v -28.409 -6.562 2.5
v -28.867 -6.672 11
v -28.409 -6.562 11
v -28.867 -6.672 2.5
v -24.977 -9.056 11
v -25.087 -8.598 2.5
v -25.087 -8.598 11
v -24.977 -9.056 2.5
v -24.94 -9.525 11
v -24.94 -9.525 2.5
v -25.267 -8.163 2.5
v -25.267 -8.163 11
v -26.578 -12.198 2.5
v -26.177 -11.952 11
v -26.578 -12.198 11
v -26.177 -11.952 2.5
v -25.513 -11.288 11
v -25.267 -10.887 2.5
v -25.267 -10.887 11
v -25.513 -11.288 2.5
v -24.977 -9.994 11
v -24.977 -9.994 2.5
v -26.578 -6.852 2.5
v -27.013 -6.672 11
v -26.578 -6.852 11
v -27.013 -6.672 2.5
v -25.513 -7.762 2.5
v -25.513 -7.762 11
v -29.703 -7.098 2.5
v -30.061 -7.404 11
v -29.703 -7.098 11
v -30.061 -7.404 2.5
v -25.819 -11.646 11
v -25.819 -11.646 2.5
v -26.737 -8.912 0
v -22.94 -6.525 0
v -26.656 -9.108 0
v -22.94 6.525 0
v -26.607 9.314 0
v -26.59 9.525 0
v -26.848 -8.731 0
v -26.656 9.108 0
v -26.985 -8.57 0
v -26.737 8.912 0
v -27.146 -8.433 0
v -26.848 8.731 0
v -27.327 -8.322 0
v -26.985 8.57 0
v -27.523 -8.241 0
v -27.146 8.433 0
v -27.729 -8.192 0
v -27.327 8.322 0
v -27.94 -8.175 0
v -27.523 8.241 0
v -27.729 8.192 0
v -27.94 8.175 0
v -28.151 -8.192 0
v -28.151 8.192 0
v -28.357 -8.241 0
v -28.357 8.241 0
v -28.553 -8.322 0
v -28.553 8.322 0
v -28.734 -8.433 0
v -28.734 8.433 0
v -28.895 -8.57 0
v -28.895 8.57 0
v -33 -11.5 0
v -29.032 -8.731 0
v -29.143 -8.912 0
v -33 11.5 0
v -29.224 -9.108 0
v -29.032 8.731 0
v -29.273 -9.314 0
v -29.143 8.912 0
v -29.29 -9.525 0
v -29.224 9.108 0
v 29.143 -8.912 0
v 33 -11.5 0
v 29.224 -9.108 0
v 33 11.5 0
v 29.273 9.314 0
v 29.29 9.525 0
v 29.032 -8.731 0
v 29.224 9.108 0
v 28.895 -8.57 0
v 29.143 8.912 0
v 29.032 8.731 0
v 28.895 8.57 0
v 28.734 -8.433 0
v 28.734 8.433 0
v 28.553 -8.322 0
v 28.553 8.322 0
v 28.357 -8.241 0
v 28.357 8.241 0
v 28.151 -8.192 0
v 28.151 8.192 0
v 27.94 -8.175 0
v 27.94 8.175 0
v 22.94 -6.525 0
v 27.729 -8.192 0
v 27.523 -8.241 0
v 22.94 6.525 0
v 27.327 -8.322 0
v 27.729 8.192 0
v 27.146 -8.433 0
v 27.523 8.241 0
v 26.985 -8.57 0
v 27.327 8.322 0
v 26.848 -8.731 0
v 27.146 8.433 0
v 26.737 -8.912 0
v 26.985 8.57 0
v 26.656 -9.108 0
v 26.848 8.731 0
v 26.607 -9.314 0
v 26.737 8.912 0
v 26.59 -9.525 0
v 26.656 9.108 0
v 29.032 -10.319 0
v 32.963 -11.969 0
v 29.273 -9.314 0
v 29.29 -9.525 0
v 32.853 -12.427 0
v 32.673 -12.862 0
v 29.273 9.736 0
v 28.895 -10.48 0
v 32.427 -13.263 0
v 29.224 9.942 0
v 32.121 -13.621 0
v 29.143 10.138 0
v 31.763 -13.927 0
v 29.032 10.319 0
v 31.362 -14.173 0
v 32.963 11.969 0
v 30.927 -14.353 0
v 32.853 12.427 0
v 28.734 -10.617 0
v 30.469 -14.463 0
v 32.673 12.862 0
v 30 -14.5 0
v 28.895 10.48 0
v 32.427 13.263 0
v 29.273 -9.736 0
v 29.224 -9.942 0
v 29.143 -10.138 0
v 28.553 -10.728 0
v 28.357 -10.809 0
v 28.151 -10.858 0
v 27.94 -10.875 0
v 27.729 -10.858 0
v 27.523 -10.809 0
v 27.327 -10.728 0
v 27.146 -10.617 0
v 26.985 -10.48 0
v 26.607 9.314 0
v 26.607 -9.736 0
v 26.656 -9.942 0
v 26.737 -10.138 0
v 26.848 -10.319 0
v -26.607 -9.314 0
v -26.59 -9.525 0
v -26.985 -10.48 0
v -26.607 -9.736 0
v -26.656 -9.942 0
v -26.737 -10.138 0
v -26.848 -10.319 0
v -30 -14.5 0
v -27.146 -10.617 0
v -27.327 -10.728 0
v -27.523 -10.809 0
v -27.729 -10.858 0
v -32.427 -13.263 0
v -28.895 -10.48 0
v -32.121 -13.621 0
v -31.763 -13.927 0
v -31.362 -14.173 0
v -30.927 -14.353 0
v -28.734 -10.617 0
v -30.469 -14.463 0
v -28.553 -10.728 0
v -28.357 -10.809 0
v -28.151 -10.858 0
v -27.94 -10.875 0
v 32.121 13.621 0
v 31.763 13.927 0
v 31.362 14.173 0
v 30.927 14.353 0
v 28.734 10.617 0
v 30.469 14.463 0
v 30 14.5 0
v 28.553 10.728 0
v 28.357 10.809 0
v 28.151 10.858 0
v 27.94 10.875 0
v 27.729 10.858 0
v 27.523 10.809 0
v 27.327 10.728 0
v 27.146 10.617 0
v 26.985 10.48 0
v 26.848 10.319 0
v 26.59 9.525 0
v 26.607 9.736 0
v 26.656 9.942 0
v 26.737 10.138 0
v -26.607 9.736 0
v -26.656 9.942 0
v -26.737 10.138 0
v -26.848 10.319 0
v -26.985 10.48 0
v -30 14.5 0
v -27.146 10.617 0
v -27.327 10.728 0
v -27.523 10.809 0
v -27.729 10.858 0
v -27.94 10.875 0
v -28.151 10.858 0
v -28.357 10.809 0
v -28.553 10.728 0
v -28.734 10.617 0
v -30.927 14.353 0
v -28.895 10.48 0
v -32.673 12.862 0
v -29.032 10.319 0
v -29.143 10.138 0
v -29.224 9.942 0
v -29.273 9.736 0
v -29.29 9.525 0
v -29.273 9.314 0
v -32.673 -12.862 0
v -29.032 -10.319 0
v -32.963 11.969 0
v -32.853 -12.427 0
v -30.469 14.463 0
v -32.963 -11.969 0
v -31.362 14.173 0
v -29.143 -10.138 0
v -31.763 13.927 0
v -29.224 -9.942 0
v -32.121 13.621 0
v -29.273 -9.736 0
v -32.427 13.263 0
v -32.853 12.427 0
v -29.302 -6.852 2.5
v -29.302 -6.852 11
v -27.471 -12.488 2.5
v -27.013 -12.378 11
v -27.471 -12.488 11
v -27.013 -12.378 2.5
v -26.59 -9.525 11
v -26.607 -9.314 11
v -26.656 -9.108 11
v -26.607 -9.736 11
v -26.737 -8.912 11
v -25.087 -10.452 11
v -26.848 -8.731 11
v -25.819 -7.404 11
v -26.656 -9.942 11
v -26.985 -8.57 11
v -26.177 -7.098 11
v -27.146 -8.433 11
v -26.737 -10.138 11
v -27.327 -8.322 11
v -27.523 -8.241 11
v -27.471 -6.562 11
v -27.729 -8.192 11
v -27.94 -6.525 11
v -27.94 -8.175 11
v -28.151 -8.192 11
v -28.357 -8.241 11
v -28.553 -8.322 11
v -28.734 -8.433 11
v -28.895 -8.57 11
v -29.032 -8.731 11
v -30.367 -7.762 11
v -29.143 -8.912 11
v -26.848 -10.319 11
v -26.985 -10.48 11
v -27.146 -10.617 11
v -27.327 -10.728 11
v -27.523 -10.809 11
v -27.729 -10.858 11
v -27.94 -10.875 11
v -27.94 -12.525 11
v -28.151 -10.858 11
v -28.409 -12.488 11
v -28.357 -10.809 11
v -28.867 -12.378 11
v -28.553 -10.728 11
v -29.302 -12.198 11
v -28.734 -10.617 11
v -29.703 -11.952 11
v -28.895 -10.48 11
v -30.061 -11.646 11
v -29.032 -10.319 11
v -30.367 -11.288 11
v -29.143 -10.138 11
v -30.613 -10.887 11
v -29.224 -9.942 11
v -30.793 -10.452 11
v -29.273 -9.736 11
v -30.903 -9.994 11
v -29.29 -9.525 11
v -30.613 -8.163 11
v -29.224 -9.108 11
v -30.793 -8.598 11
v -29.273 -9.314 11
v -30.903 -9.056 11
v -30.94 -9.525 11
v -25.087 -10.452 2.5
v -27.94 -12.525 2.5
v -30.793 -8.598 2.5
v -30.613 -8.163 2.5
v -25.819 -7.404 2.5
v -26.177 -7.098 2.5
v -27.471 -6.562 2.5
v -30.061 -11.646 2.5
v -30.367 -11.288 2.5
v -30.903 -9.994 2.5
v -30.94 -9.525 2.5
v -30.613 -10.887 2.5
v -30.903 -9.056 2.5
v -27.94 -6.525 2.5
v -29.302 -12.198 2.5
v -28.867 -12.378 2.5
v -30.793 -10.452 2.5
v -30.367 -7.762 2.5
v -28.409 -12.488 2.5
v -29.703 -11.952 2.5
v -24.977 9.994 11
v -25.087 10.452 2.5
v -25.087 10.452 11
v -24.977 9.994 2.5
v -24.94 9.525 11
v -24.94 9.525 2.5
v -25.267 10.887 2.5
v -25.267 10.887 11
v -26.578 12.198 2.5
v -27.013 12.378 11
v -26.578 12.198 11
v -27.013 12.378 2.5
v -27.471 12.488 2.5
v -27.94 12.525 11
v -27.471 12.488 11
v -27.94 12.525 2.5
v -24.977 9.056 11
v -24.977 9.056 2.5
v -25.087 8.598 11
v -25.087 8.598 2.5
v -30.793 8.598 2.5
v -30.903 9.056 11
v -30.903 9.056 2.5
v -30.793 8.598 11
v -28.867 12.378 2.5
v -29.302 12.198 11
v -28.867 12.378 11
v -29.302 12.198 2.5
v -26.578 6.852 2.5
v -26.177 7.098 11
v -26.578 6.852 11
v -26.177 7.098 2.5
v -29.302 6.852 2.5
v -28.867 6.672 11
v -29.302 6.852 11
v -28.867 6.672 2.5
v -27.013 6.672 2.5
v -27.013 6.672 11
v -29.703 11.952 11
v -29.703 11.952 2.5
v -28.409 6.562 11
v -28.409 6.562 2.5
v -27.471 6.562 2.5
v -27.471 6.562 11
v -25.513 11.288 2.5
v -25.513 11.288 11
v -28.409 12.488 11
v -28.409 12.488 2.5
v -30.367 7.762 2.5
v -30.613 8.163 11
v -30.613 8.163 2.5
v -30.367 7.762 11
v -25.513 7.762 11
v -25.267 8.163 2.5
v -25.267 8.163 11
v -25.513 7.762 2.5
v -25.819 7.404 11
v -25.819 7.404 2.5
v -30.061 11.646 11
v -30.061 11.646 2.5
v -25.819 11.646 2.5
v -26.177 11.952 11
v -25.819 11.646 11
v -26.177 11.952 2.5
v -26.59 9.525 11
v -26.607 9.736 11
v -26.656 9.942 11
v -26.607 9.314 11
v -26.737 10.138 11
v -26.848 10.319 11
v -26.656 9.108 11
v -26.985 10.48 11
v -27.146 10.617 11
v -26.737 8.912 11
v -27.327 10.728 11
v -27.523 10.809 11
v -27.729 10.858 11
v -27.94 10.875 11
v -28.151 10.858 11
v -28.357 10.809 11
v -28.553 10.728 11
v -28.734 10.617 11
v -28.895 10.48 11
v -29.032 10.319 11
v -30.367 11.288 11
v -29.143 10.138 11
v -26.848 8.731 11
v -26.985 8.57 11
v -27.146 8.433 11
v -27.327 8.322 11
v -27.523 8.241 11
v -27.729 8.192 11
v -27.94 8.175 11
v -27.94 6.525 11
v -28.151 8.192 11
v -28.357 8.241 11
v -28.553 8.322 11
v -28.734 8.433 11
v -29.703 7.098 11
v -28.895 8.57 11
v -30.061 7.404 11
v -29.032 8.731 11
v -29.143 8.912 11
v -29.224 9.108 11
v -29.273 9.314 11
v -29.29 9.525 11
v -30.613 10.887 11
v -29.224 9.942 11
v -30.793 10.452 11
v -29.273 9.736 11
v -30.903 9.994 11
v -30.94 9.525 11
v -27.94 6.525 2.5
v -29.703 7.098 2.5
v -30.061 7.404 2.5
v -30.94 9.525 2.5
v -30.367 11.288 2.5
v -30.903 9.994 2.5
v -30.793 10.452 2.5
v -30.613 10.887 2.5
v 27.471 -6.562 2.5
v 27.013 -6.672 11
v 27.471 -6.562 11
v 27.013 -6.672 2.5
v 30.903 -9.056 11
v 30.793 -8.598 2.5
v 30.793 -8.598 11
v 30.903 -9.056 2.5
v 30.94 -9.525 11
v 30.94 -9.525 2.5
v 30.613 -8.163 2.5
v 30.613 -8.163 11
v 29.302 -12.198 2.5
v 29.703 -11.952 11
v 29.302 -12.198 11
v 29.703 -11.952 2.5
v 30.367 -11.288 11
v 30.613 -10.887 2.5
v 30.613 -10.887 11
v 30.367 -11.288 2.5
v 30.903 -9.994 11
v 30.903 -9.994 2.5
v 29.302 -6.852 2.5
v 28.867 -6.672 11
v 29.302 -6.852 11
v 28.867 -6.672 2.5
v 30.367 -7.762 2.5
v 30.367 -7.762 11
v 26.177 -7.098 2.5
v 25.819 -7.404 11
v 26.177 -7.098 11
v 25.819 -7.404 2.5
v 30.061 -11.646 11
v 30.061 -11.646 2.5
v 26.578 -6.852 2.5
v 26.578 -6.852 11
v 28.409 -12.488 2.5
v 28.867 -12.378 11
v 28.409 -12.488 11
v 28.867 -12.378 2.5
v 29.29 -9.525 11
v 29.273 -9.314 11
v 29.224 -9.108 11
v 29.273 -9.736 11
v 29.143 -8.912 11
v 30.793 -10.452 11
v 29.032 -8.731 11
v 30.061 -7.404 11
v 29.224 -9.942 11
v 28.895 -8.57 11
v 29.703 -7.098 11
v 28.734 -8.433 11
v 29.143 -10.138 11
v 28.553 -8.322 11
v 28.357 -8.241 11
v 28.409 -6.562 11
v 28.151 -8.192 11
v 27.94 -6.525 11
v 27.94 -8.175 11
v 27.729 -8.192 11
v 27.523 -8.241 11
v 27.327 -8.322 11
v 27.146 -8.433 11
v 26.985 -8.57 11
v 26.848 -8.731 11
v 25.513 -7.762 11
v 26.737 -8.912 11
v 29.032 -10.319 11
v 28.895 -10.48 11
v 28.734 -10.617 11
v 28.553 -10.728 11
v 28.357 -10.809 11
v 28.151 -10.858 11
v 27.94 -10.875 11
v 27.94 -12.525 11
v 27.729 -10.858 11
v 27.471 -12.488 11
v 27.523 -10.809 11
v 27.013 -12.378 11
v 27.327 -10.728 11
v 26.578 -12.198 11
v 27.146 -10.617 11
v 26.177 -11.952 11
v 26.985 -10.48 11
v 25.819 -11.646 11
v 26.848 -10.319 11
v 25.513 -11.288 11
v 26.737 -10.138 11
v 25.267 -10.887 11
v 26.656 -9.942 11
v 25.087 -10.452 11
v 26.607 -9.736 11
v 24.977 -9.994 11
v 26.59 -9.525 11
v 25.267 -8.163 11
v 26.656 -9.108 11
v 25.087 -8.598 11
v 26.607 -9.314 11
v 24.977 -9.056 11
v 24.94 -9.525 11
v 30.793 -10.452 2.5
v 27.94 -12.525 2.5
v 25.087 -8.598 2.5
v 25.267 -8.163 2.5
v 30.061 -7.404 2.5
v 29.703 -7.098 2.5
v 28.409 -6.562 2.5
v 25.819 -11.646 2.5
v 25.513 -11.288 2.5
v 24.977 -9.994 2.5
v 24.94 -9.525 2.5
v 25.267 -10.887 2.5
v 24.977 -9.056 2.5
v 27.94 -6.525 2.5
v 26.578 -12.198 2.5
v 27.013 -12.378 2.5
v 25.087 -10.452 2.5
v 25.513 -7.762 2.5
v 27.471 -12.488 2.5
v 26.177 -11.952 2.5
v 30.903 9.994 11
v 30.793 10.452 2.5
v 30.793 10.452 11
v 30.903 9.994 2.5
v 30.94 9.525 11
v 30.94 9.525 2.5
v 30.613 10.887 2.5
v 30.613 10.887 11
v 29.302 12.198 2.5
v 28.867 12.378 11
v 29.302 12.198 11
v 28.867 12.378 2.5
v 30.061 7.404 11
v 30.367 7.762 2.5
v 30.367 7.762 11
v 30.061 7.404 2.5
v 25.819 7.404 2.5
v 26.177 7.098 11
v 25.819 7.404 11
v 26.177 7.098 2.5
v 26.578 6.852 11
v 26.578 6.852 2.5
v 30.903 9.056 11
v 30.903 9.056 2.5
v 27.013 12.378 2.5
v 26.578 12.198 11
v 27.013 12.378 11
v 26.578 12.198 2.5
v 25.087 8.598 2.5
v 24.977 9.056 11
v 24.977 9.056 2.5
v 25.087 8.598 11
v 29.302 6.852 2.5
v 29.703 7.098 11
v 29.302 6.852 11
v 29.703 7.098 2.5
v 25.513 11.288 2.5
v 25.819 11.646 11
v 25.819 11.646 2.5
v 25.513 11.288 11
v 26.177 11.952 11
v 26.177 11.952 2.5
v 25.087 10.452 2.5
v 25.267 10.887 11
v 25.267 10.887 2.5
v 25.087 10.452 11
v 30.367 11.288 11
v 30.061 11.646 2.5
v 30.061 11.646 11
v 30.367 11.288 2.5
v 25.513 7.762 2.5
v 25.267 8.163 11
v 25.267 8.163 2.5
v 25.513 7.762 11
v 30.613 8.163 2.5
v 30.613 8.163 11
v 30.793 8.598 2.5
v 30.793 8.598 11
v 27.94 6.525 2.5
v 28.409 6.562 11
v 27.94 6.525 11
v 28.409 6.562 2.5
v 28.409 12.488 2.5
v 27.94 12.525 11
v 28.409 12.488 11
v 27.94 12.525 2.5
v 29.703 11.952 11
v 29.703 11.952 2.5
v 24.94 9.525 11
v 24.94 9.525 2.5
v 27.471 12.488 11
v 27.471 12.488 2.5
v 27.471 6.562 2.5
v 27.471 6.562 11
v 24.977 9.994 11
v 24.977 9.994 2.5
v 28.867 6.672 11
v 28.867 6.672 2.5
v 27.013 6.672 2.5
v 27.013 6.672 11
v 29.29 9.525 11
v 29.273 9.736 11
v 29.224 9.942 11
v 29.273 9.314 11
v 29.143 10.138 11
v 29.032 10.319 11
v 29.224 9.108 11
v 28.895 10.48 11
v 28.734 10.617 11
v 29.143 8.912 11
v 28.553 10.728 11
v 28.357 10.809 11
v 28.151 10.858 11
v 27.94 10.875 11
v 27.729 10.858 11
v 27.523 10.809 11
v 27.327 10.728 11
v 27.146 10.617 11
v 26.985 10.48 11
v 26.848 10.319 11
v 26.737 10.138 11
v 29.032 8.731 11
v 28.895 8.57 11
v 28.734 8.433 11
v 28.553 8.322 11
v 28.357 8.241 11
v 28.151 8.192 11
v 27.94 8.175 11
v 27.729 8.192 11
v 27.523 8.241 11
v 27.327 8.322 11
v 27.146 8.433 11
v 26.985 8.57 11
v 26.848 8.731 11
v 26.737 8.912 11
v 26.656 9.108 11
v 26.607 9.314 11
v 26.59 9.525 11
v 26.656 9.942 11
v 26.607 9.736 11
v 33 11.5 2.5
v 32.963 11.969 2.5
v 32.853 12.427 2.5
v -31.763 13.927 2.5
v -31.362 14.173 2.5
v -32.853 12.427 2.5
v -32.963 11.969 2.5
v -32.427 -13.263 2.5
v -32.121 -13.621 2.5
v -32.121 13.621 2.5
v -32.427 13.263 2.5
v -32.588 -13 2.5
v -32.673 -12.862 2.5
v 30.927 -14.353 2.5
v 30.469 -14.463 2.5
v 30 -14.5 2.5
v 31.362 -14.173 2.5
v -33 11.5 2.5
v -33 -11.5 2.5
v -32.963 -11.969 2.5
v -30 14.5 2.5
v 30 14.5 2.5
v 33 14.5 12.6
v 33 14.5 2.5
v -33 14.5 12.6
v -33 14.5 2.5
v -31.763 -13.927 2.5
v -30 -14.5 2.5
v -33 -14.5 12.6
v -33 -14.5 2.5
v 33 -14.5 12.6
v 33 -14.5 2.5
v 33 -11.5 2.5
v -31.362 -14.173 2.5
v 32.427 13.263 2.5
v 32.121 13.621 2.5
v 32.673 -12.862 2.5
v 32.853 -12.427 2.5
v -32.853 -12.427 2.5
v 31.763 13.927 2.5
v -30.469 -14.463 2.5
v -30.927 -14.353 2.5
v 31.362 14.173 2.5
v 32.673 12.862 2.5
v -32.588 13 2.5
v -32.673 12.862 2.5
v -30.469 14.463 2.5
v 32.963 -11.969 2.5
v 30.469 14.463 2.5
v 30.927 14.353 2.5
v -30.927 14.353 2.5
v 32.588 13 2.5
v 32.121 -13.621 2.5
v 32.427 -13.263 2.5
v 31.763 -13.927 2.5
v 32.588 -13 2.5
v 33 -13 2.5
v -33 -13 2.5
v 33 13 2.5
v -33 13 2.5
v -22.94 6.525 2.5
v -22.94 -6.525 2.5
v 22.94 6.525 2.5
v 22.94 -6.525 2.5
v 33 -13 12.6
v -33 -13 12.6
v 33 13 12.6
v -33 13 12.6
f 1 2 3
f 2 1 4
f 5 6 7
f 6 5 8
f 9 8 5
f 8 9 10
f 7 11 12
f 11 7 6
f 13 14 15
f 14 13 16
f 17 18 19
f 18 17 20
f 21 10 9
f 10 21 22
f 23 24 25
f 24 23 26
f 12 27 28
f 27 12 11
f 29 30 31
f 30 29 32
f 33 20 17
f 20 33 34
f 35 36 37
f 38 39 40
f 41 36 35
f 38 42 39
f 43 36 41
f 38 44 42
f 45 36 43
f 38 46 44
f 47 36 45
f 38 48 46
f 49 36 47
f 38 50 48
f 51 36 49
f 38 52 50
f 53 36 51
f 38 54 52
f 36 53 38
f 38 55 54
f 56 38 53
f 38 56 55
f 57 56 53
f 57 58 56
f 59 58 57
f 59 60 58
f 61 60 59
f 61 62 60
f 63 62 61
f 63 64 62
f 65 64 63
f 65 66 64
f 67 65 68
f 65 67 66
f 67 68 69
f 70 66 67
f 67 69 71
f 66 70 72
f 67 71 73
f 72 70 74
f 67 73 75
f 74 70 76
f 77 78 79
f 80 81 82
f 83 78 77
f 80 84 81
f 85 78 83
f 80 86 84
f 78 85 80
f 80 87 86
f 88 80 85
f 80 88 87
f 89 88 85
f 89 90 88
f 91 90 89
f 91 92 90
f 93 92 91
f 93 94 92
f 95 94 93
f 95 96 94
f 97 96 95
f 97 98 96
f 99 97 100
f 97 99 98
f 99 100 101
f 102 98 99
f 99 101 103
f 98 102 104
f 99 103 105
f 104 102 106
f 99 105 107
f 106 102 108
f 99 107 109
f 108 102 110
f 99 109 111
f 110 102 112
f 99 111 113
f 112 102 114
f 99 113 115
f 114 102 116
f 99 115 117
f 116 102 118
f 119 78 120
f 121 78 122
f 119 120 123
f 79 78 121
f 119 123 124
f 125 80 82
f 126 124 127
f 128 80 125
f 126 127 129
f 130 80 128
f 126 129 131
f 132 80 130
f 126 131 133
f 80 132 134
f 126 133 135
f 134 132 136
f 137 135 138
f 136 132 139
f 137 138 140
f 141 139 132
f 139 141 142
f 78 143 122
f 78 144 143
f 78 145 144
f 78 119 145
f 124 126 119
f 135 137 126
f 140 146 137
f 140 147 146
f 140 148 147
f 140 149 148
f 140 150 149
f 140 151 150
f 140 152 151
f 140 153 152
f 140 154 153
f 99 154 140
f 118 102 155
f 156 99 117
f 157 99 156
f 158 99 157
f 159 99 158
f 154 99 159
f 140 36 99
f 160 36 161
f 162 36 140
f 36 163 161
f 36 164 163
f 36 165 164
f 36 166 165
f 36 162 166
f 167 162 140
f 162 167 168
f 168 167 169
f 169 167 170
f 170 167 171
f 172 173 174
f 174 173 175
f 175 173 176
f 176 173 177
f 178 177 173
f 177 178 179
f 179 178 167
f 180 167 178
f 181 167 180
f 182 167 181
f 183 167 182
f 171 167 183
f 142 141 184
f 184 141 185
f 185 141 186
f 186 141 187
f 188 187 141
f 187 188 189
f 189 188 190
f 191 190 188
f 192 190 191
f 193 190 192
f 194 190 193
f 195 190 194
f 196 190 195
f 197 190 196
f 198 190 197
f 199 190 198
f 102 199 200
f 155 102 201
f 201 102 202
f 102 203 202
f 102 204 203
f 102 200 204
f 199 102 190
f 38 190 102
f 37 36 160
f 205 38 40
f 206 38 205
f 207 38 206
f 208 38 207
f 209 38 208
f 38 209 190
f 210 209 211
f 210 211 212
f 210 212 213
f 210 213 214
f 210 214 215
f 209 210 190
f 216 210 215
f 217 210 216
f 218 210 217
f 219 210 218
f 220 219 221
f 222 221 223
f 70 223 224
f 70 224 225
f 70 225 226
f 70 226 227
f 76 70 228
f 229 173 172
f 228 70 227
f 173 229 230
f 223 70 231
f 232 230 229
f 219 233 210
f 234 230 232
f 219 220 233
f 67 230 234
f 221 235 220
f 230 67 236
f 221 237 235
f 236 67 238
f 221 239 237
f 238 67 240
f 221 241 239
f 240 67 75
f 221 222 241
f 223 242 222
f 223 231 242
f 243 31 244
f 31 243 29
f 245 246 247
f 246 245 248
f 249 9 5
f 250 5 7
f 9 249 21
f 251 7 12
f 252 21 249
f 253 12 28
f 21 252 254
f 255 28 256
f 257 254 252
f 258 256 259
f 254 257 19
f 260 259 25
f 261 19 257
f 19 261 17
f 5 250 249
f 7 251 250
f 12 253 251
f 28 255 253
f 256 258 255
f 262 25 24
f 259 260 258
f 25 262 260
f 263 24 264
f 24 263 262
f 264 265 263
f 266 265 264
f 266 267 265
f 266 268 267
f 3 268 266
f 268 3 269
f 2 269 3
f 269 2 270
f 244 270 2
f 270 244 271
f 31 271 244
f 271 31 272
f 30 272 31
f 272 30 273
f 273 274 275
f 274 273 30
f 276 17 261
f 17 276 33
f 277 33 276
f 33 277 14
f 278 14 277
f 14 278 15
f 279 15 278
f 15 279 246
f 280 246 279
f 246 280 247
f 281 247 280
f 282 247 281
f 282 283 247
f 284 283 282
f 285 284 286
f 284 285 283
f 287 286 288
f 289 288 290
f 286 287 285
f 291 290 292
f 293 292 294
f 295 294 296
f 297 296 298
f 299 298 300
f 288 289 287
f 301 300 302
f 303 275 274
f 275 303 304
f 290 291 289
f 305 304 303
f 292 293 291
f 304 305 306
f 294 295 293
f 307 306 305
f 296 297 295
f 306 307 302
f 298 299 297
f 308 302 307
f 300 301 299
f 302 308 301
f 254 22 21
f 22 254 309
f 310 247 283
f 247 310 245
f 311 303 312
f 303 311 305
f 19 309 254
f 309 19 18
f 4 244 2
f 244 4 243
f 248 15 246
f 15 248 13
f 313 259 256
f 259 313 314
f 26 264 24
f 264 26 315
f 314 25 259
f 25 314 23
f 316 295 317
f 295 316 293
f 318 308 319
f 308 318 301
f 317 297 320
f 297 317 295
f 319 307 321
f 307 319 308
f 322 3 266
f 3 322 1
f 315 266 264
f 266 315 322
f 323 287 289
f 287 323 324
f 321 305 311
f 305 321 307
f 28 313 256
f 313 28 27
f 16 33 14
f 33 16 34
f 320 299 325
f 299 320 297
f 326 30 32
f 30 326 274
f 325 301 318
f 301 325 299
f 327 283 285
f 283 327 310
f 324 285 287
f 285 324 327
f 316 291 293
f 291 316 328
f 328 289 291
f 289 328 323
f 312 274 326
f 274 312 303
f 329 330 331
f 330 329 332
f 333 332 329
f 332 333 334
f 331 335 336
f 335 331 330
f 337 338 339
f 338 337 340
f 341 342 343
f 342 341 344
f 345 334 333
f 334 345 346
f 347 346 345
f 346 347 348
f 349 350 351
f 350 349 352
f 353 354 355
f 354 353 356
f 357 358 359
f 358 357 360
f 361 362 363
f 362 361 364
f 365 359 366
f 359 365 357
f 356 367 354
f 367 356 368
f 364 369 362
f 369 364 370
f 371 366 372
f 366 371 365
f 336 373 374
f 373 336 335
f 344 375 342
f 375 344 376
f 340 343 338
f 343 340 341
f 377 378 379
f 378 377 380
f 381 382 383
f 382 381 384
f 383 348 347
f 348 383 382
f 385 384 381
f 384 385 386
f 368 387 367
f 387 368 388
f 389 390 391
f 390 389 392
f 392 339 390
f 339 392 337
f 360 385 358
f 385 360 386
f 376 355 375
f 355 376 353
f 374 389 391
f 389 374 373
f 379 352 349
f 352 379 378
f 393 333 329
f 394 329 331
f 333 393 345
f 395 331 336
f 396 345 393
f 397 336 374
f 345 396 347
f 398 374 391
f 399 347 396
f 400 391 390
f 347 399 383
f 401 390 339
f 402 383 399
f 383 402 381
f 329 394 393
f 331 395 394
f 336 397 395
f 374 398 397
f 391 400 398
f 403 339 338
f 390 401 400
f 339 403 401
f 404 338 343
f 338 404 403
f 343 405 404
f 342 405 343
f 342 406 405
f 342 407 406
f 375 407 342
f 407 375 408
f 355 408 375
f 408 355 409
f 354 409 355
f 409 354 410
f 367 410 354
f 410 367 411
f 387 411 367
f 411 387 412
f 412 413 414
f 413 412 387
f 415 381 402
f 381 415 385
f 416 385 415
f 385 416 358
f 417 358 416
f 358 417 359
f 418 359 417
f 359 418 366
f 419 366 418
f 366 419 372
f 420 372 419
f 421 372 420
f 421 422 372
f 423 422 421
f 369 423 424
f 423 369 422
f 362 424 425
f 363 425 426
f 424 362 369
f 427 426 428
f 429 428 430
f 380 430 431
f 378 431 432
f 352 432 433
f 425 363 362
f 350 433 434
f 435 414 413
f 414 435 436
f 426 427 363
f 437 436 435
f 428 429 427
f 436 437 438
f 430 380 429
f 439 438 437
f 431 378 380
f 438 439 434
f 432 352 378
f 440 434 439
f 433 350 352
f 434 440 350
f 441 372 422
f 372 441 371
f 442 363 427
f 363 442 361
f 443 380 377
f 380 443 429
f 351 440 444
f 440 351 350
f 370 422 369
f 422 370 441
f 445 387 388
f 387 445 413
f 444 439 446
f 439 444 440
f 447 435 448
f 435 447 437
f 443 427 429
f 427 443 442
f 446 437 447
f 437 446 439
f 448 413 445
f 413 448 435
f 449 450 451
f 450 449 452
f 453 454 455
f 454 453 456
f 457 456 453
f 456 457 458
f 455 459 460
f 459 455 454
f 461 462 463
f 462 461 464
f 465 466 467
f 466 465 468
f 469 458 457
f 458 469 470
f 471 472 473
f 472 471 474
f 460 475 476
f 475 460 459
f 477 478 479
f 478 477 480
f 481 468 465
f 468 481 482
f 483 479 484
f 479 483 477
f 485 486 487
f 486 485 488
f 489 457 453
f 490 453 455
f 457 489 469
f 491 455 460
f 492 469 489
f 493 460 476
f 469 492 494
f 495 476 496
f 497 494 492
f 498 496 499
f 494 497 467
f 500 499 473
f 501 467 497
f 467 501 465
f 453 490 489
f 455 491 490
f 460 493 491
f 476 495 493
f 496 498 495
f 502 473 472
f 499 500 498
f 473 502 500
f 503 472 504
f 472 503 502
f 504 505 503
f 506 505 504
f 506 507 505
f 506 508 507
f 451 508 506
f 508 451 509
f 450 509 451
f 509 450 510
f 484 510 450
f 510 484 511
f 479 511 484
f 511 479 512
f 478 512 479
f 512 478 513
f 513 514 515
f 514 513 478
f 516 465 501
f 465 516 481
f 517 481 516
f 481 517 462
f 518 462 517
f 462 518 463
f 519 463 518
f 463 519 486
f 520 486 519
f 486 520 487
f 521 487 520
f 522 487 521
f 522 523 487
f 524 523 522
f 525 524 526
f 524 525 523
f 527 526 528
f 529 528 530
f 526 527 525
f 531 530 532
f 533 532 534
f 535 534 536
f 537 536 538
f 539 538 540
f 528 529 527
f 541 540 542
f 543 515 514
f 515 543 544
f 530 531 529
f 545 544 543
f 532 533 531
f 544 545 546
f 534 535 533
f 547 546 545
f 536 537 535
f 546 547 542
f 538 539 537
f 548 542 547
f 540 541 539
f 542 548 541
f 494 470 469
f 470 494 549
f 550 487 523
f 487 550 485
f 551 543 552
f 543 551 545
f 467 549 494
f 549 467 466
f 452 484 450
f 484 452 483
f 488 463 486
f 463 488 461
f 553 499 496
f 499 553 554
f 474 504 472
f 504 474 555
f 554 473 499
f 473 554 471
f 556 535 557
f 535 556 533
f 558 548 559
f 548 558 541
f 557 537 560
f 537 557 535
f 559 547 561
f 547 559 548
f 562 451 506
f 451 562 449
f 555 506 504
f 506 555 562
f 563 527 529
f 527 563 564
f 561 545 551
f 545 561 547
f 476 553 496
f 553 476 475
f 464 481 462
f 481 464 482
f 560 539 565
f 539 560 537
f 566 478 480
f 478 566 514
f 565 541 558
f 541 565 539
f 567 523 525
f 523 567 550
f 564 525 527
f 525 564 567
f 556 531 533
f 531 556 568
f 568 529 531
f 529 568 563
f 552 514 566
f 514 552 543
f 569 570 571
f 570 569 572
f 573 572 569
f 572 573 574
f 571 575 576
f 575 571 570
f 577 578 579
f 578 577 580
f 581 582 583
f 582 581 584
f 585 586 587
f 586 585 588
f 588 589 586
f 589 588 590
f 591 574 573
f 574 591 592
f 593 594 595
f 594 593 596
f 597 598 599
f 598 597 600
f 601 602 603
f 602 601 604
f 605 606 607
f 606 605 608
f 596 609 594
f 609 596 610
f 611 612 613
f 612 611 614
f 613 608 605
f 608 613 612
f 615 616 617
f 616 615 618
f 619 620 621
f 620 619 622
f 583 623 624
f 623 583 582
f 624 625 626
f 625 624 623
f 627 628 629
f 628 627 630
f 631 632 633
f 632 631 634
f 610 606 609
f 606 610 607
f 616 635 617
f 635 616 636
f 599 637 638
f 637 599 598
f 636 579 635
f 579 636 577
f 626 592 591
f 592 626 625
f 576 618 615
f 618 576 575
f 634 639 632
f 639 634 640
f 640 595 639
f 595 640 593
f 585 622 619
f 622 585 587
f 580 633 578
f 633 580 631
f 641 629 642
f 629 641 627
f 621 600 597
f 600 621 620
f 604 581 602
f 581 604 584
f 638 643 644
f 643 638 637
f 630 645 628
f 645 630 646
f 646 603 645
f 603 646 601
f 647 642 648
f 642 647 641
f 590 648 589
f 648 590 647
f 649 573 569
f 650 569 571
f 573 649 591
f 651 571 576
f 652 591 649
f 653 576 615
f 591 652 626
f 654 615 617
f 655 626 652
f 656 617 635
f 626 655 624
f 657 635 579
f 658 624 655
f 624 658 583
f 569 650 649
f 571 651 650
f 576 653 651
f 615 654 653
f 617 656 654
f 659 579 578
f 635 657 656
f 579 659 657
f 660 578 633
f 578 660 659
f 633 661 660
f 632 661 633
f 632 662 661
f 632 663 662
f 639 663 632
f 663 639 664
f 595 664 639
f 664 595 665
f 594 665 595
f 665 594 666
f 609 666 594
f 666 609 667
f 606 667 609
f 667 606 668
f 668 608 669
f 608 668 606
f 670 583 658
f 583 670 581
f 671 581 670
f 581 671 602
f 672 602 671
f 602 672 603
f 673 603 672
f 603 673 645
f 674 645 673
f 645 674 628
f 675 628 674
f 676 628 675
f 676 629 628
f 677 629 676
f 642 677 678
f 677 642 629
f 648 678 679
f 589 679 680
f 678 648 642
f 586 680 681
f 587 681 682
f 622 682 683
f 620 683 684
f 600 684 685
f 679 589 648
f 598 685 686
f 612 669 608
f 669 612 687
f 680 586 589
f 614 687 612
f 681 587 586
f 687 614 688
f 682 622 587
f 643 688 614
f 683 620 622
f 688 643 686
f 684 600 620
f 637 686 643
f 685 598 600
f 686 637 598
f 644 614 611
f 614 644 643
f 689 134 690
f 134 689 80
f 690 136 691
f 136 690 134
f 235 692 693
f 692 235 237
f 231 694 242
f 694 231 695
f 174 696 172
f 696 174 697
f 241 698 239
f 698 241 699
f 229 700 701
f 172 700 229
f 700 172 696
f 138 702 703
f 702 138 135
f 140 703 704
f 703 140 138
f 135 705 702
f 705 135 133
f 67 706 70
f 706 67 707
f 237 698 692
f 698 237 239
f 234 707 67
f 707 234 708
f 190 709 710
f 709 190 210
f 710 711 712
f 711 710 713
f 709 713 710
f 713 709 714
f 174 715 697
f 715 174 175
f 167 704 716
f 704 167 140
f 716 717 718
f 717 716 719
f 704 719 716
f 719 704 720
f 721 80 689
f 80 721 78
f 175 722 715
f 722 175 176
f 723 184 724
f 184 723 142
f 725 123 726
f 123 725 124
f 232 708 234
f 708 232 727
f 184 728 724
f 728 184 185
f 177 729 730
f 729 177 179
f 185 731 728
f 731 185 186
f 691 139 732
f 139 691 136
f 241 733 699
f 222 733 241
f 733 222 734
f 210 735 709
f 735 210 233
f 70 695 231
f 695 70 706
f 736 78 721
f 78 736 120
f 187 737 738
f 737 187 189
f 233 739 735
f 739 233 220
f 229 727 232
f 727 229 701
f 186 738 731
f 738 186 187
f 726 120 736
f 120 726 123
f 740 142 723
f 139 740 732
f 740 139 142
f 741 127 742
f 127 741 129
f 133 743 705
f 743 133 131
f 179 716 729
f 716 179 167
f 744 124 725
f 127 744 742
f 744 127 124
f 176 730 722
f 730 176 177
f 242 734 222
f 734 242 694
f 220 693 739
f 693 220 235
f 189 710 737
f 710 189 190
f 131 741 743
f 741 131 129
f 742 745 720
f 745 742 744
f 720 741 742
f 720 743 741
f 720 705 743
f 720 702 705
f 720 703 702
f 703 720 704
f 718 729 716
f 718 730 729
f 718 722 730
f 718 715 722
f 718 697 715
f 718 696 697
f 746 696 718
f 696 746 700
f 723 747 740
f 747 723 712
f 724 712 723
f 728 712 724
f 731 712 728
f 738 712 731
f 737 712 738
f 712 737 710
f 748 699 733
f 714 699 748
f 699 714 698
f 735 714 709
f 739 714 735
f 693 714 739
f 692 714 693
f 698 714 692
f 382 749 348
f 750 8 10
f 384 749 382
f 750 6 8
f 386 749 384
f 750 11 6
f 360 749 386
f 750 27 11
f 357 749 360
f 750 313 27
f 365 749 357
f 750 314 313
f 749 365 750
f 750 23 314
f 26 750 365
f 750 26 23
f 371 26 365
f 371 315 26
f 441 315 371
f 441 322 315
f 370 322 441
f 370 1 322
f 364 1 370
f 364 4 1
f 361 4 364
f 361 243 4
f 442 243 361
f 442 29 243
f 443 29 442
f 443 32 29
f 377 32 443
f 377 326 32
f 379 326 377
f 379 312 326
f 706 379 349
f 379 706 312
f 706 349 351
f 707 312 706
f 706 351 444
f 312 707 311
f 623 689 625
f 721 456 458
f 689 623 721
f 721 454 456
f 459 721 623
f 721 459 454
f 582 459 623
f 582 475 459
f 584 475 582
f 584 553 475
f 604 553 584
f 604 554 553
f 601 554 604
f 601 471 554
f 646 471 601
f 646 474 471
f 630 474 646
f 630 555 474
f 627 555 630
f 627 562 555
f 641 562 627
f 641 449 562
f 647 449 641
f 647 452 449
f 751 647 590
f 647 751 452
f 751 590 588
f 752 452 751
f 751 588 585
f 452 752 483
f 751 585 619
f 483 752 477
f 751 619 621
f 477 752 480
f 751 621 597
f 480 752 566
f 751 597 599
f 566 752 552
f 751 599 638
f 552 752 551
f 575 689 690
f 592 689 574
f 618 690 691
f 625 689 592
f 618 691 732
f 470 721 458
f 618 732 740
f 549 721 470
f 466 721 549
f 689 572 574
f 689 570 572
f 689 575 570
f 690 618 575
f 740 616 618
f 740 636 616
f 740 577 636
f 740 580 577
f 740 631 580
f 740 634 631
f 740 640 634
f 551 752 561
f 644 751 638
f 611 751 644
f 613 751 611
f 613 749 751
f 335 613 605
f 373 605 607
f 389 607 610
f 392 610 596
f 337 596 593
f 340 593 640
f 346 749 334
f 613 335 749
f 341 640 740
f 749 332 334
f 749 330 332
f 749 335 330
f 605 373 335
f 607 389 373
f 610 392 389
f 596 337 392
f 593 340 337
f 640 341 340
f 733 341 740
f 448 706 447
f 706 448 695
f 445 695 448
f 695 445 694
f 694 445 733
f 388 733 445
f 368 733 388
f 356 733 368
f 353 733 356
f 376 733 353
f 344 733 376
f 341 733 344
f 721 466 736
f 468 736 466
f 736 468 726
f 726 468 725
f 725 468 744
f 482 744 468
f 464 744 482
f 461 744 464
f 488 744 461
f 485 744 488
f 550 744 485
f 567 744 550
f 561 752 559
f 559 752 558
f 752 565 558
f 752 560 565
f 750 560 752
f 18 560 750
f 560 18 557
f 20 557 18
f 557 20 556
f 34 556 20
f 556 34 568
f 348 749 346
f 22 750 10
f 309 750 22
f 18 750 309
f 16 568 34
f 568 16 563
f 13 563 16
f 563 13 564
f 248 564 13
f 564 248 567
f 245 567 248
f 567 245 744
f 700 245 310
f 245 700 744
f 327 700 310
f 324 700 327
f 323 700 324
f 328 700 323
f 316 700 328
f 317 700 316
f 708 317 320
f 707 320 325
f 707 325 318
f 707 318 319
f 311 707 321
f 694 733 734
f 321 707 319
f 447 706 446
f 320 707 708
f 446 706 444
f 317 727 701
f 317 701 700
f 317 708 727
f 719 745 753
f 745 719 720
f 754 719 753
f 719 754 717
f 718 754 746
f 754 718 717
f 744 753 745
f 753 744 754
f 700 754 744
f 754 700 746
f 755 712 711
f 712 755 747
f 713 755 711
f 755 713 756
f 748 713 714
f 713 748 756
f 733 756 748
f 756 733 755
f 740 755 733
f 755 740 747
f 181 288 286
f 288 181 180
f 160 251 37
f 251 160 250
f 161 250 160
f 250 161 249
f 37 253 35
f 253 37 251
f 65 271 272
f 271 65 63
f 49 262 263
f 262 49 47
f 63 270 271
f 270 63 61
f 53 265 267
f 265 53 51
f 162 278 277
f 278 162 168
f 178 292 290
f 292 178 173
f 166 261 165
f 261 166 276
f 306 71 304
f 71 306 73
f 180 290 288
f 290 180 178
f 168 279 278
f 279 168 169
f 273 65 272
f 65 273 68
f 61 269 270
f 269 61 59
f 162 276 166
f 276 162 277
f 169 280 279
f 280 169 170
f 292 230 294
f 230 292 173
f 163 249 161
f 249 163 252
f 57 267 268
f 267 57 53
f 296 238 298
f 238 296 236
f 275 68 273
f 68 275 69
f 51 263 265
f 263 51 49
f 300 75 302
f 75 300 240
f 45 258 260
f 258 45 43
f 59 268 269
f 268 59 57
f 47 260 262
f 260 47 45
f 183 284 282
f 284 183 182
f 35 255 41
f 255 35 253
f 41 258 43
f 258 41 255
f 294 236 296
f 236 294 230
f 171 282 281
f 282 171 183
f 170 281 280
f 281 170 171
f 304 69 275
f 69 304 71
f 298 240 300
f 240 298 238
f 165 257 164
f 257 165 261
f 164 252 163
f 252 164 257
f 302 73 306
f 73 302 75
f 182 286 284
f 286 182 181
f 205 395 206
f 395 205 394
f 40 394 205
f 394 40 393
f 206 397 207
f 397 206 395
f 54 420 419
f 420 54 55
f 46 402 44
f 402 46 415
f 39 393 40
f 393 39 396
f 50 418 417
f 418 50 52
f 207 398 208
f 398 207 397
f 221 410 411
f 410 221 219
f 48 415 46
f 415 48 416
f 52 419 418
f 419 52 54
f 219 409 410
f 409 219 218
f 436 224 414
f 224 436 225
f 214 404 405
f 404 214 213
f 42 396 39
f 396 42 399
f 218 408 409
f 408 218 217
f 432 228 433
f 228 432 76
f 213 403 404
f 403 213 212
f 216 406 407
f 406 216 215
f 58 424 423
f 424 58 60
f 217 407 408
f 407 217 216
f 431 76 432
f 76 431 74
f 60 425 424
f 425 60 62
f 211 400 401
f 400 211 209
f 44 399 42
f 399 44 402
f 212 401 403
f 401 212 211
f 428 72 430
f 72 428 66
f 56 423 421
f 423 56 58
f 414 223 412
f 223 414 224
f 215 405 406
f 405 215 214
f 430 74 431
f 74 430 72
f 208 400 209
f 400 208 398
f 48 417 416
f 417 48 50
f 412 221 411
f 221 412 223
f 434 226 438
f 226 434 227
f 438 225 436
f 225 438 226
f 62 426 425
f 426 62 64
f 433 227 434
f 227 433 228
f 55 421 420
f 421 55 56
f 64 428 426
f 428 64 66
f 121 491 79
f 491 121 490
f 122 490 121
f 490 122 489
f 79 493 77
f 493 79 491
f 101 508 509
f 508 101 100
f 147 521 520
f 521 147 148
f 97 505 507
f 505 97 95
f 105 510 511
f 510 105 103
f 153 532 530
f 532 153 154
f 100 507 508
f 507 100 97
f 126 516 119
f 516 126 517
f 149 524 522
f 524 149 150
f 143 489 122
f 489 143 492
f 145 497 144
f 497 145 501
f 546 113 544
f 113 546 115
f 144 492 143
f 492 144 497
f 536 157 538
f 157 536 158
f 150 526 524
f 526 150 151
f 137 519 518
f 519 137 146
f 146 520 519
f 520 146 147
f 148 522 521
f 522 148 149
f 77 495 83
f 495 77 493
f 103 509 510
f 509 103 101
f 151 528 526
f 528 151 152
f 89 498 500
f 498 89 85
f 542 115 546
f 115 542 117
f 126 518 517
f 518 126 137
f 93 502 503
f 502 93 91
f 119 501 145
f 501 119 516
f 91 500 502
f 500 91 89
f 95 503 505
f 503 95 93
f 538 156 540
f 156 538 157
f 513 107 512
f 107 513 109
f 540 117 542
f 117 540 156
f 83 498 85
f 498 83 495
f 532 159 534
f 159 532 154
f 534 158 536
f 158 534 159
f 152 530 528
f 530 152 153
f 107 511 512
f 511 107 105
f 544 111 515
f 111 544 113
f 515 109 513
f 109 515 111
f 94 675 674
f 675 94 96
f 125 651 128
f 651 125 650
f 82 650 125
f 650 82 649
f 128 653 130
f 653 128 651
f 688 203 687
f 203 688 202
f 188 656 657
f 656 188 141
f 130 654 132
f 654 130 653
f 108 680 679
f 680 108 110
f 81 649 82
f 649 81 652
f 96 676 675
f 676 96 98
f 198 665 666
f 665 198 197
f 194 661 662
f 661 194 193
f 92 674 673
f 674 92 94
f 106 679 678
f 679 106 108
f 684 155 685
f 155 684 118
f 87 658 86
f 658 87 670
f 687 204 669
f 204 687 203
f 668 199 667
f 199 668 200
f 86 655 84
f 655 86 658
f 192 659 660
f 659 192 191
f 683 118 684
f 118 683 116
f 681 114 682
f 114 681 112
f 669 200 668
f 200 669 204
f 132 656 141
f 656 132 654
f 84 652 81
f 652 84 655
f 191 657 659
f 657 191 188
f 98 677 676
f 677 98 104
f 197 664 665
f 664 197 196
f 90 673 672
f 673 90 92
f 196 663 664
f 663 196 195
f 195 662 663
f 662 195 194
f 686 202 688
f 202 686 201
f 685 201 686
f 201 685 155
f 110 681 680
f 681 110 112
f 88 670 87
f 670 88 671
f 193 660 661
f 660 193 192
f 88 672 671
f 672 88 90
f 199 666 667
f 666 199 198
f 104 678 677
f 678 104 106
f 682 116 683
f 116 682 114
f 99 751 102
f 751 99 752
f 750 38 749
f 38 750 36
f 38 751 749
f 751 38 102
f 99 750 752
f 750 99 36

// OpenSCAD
// ROBOMOTION 5-DOF Robotic Arm - PCA9685 Servo Controller Mounting Bracket
// Designed for mounting PCA9685 16-ch module to motherboard PCB via 4x M2.5 standoffs
// Hole spacing: 55.88mm x 19.05mm

$fn = 40;

// Dimensions (mm)
hole_dx = 55.88; // Hole spacing long axis
hole_dy = 19.05; // Hole spacing short axis
bracket_length = 66.0;
bracket_width  = 29.0;
base_thick     = 2.5;
standoff_h     = 11.0; // Height matching female header socket
pillar_d       = 6.0;
screw_hole_d   = 2.7;  // Clearance for M2.5 screws

module pca9685_mount() {
    difference() {
        union() {
            // Main base plate with rounded corners
            hull() {
                translate([-(bracket_length/2 - 3), -(bracket_width/2 - 3), 0])
                    cylinder(r=3, h=base_thick);
                translate([(bracket_length/2 - 3), -(bracket_width/2 - 3), 0])
                    cylinder(r=3, h=base_thick);
                translate([(bracket_length/2 - 3), (bracket_width/2 - 3), 0])
                    cylinder(r=3, h=base_thick);
                translate([-(bracket_length/2 - 3), (bracket_width/2 - 3), 0])
                    cylinder(r=3, h=base_thick);
            }
            
            // 4 Standoff pillars
            for (sx = [-1, 1]) {
                for (sy = [-1, 1]) {
                    translate([sx * hole_dx/2, sy * hole_dy/2, 0])
                        cylinder(d=pillar_d, h=standoff_h);
                }
            }
            
            // Side alignment ribs (prevent module sliding)
            translate([-bracket_length/2, -(bracket_width/2), base_thick])
                cube([bracket_length, 1.5, standoff_h - base_thick + 1.6]);
            translate([-bracket_length/2, (bracket_width/2 - 1.5), base_thick])
                cube([bracket_length, 1.5, standoff_h - base_thick + 1.6]);
        }
        
        // Center cutout for header pins and airflow
        translate([-(hole_dx/2 - 5), -(hole_dy/2 - 3), -1])
            cube([hole_dx - 10, hole_dy - 6, base_thick + 2]);
            
        // 4 screw holes (M2.5 clearance throughout pillars & base)
        for (sx = [-1, 1]) {
            for (sy = [-1, 1]) {
                translate([sx * hole_dx/2, sy * hole_dy/2, -1])
                    cylinder(d=screw_hole_d, h=standoff_h + 4);
            }
        }
    }
}

pca9685_mount();
